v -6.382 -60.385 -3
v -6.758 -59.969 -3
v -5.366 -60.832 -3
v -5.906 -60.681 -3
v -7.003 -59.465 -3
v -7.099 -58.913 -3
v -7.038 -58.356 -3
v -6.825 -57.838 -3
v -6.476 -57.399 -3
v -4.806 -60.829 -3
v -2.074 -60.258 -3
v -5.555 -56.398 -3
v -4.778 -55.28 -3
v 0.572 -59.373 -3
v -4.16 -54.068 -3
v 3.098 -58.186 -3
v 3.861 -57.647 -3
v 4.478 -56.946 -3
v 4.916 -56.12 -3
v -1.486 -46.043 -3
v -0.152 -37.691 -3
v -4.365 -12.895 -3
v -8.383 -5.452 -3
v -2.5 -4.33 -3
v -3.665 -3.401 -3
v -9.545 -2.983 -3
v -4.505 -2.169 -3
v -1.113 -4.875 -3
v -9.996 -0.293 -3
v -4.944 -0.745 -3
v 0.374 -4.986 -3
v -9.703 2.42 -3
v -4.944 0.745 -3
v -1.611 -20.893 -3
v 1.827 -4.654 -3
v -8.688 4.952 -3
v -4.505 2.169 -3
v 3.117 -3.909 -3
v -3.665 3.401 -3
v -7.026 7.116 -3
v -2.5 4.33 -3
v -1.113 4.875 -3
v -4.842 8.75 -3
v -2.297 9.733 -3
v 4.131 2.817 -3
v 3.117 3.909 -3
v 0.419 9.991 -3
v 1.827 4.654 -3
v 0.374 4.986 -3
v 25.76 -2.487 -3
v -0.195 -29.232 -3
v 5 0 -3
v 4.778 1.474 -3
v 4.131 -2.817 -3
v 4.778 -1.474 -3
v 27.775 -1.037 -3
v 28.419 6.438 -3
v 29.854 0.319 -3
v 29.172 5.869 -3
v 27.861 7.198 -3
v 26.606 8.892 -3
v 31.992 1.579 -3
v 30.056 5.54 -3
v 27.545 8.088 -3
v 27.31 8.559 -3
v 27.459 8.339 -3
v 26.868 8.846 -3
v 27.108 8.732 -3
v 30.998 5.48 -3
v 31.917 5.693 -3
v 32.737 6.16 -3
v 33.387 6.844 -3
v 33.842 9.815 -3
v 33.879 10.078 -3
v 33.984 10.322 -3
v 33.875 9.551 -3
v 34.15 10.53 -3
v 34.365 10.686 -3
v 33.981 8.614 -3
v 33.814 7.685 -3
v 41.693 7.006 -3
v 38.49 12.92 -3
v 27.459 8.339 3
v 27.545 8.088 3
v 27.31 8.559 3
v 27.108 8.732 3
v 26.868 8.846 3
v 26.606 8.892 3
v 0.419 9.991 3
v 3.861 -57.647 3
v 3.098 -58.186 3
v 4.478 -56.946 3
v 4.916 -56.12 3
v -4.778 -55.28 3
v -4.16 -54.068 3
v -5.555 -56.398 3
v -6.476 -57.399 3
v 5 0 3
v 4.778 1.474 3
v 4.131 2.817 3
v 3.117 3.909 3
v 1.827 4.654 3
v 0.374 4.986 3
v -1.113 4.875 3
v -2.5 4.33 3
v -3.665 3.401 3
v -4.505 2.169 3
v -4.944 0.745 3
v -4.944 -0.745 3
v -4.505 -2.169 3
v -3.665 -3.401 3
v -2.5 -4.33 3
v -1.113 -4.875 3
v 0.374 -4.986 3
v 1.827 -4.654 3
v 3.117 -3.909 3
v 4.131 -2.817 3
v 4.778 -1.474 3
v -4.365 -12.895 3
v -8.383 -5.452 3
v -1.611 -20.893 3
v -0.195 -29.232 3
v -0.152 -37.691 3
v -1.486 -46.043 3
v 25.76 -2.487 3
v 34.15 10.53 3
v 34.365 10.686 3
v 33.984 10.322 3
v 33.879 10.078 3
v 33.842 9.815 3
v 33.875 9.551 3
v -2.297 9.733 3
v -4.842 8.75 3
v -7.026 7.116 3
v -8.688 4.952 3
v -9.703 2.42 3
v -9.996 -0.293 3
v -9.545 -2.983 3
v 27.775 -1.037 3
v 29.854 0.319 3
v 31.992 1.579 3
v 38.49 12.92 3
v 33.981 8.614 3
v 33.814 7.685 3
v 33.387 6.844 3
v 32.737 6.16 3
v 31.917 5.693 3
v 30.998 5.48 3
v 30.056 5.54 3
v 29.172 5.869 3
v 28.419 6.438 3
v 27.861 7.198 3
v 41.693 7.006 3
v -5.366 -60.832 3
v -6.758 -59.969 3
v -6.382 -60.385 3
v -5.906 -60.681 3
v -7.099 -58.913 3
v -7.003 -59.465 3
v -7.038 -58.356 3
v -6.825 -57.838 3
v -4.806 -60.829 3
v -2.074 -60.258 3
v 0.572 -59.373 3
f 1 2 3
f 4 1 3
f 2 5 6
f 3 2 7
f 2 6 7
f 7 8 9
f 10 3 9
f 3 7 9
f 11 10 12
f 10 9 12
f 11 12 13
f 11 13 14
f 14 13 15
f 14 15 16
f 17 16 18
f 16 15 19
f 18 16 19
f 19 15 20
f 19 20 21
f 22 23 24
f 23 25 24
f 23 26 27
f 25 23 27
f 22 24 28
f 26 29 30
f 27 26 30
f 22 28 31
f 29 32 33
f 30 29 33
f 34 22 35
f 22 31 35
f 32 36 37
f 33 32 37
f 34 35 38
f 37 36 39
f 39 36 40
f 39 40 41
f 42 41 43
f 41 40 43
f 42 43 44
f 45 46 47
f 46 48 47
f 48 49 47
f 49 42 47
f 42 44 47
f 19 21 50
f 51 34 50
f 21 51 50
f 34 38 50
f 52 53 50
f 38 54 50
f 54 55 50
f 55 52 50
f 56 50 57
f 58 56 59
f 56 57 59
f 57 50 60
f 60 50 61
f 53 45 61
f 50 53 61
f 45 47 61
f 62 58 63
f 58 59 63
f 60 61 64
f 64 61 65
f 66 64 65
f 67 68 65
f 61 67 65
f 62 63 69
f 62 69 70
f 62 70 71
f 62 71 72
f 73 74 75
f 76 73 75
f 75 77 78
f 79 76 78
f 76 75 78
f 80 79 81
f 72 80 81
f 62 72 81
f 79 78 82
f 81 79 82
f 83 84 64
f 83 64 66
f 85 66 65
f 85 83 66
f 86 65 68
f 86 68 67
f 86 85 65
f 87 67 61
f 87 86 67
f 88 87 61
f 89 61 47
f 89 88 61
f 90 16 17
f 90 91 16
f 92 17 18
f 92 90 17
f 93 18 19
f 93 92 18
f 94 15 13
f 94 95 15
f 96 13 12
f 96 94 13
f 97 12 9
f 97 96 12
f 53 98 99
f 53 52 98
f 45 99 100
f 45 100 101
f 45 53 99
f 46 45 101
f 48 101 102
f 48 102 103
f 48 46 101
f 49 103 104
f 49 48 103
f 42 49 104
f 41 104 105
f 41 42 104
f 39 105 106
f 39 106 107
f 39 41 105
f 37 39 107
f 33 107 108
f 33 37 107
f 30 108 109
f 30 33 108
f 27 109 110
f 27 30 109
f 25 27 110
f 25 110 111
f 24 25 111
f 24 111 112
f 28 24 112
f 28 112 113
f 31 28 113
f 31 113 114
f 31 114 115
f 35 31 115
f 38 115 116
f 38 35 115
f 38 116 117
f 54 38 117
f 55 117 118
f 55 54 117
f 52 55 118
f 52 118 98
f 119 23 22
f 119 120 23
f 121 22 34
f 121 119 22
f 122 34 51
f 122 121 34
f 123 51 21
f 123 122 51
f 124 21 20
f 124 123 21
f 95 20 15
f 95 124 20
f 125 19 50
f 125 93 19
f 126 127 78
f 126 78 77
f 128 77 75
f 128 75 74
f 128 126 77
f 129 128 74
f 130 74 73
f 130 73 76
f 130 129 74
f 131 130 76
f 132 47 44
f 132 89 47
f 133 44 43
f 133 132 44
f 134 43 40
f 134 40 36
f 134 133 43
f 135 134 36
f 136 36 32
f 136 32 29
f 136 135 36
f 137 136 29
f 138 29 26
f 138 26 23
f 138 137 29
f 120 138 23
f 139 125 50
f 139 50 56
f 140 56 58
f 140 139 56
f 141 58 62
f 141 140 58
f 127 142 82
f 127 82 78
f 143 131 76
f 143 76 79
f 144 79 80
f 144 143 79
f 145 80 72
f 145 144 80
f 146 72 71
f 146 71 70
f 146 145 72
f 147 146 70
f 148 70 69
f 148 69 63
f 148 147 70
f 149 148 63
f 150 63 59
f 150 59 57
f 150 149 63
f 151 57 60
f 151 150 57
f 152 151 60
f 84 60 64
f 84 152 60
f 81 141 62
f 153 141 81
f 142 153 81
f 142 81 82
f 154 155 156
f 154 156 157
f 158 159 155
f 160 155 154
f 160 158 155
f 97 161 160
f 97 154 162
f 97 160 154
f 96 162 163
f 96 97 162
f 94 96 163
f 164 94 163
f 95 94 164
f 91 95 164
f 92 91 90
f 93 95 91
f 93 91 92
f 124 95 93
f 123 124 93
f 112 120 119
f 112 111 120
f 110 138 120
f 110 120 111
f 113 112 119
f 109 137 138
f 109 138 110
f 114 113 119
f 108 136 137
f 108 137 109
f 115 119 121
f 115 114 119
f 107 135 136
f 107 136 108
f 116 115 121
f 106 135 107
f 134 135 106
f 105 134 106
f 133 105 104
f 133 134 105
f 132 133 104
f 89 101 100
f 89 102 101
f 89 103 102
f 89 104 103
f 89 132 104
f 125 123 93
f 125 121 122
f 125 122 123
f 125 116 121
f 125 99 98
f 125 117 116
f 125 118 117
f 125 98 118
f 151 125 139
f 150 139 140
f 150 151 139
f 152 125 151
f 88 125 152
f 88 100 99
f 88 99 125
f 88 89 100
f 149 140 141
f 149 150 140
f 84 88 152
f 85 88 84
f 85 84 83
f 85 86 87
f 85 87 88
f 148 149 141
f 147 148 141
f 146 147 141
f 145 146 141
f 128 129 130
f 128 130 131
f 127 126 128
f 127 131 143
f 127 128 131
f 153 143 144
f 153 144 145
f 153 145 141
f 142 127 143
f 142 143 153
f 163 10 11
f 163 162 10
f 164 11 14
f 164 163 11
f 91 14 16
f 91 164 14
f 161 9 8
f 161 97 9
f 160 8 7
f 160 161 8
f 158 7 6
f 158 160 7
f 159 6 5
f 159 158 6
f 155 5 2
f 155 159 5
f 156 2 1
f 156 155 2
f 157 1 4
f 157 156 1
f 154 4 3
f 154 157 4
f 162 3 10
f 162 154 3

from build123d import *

# Parameters (mm, degrees)
SKETCH_1_R      = 5
EXTRUDE_1_DEPTH = 3


with BuildPart() as part:
    # Эскиз1 → Бобышка-Вытянуть1 (new body, symmetric)
    with BuildSketch(Plane.XY):
        with BuildLine():
            Line((4.916234413, -56.120413603), (25.760048074, -2.486528587))
            ThreePointArc((25.760048074, -2.486528587), (28.806805421, -0.347478176), (31.992021255, 1.579350067))
            Line((31.992021255, 1.579350067), (41.693220111, 7.005736507))
            Line((41.693220111, 7.005736507), (38.489887361, 12.920302494))
            Line((38.489887361, 12.920302494), (34.365244293, 10.68639315))
            ThreePointArc((34.365244293, 10.68639315), (33.923481874, 10.203655675), (33.874797711, 9.55110732))
            ThreePointArc((33.874797711, 9.55110732), (31.465191403, 5.552741192), (27.545035778, 8.087600975))
            ThreePointArc((27.545035778, 8.087600975), (27.214853309, 8.652551452), (26.606025774, 8.892381677))
            Line((26.606025774, 8.892381677), (0.41924208, 9.991207939))
            ThreePointArc((0.41924208, 9.991207939), (-8.687811377, 4.951962588), (-8.383148839, -5.451863492))
            ThreePointArc((-8.383148839, -5.451863492), (-0.194512316, -29.232087684), (-4.16010245, -54.068088281))
            ThreePointArc((-4.16010245, -54.068088281), (-5.14748476, -55.852284698), (-6.476272813, -57.39908882))
            ThreePointArc((-6.476272813, -57.39908882), (-6.89807893, -59.725920701), (-4.806109838, -60.82852322))
            ThreePointArc((-4.806109838, -60.82852322), (-0.738045269, -59.854283225), (3.097962953, -58.185950579))
            ThreePointArc((3.097962953, -58.185950579), (4.190313841, -57.314464556), (4.916234413, -56.120413603))
        make_face()
        Circle(SKETCH_1_R, mode=Mode.SUBTRACT)
    extrude(amount=EXTRUDE_1_DEPTH, both=True)


solid = part.part
